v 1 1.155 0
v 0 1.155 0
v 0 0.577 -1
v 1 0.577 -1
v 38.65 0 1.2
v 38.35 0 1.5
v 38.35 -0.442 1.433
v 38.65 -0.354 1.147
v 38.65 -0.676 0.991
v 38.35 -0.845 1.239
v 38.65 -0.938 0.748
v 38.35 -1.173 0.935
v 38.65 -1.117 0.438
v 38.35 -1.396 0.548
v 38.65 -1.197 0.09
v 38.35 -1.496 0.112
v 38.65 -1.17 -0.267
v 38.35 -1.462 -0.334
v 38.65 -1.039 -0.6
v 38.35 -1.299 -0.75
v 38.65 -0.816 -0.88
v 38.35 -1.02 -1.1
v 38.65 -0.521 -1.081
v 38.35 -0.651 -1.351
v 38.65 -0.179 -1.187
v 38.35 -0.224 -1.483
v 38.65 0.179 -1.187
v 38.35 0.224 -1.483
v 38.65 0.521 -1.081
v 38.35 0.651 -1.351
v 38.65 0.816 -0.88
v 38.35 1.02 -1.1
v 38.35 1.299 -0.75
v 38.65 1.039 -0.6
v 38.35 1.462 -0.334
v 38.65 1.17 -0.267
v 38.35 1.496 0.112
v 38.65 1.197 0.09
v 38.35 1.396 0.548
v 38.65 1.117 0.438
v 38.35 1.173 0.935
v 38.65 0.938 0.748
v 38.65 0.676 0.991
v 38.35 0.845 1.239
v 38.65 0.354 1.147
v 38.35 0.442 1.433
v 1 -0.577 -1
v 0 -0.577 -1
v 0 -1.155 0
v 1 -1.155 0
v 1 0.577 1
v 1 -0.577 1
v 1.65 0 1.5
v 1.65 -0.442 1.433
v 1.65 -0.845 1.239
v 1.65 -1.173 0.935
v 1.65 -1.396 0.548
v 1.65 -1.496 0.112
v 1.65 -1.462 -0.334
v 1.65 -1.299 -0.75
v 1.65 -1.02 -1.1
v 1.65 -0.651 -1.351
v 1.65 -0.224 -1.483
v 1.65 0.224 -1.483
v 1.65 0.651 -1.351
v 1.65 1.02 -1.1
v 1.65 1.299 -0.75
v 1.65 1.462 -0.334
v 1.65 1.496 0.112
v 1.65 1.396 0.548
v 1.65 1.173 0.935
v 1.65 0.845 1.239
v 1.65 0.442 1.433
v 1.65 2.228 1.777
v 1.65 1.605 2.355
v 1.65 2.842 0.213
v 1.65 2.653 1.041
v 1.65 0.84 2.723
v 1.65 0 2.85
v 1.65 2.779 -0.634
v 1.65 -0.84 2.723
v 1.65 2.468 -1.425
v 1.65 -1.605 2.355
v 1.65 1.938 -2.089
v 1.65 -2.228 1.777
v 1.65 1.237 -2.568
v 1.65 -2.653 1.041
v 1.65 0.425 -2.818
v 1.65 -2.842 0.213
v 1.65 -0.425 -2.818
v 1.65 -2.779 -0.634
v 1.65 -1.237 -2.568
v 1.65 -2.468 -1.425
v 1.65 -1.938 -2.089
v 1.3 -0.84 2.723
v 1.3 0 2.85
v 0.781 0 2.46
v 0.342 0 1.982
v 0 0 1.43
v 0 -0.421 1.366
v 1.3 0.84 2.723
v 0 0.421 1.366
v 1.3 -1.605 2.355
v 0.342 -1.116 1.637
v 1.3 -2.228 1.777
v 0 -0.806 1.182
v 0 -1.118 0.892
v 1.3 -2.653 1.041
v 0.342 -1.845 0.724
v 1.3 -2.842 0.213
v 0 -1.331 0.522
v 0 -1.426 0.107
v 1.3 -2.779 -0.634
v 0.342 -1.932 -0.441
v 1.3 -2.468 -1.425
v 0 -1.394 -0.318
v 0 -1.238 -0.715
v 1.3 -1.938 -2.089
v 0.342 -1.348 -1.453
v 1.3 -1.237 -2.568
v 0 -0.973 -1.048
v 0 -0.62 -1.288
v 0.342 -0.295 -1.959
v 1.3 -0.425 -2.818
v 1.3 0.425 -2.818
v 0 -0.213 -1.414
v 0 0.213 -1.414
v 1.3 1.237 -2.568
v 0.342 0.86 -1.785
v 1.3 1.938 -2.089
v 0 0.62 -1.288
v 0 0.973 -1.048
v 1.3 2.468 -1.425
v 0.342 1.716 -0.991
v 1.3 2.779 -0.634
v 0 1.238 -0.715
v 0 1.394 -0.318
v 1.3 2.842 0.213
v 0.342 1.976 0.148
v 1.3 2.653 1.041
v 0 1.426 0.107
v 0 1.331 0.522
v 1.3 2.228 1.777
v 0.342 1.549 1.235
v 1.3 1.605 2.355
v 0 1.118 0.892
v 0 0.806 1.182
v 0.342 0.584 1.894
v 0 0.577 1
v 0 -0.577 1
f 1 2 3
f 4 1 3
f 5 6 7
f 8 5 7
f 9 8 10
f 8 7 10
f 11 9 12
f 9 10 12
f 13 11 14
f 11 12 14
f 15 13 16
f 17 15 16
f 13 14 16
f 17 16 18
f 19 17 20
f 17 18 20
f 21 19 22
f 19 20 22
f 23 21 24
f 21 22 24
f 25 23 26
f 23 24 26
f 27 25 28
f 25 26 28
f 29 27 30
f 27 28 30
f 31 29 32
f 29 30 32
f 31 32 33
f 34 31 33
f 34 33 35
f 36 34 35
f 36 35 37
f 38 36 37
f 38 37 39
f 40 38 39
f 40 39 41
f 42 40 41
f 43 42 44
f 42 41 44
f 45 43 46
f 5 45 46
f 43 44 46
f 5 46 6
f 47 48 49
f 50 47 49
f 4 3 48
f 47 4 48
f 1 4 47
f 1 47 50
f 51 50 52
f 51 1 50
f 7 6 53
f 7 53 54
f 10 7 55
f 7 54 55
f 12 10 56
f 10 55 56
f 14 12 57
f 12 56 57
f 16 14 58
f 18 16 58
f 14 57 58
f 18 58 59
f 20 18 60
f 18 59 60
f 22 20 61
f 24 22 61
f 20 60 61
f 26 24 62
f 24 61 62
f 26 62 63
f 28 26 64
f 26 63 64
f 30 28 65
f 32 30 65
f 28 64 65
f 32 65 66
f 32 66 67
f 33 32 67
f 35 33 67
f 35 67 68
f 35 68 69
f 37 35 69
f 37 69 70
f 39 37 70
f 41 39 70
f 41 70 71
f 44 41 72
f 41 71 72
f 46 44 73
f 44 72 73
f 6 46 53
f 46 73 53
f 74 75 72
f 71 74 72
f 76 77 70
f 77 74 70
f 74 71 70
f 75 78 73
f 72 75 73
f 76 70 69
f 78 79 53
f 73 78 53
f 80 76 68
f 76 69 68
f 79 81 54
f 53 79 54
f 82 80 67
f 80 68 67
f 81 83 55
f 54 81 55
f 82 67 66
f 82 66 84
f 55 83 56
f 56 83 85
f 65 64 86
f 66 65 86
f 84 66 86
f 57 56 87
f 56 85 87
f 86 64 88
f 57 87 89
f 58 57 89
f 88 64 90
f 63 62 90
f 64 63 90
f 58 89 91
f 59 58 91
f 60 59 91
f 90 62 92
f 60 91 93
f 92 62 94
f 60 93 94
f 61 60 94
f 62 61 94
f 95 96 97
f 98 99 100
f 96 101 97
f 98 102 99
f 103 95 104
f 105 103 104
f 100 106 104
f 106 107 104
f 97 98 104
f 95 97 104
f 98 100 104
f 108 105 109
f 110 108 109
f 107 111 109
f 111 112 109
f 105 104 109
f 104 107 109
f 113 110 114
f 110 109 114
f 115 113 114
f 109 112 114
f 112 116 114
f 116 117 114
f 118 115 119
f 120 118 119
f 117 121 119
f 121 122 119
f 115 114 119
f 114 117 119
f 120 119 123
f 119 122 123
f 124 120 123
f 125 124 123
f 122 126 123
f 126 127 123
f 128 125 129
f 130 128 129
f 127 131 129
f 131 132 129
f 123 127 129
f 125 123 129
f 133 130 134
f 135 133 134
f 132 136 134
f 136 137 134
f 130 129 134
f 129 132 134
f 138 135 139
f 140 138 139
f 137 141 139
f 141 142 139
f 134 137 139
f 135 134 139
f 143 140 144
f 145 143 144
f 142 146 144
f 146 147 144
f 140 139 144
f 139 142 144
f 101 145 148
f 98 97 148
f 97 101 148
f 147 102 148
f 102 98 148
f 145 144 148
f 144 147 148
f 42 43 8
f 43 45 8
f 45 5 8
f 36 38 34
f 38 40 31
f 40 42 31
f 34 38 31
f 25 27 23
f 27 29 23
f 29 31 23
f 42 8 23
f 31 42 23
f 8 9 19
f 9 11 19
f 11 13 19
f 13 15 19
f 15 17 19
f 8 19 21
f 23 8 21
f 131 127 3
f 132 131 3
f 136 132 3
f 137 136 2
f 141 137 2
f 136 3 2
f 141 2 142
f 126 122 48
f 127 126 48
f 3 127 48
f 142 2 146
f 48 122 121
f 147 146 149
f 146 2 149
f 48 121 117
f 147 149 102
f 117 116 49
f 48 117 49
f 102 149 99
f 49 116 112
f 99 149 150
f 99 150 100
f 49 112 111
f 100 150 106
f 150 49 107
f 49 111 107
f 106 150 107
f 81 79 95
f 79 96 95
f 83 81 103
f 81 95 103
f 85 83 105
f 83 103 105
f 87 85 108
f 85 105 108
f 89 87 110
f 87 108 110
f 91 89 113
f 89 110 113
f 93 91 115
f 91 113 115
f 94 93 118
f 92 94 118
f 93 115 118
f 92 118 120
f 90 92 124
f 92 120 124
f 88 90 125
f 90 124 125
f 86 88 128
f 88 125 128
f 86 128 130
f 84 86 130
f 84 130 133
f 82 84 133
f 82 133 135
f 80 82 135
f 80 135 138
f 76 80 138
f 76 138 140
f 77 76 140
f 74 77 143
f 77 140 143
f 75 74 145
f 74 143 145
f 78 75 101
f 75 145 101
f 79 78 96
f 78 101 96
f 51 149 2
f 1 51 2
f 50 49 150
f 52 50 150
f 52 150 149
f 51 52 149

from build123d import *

# Parameters (mm, degrees)
CHAMFER1_SIZE      = 0.3
CUT_EXTRUDE1_DEPTH = 1


with BuildPart() as part:
    # Sketch1 → Revolve1 (revolve)
    with BuildSketch(Plane.XY, mode=Mode.PRIVATE) as revolve1_sk:
        with BuildLine():
            Line((0, 1.43), (0, 0))
            Line((0, 0), (38.65, 0))
            Line((38.65, 0), (38.65, 1.5))
            Line((38.65, 1.5), (1.65, 1.5))
            Line((1.65, 1.5), (1.65, 2.85))
            Line((1.65, 2.85), (1.3, 2.85))
            ThreePointArc((1.3, 2.85), (0.550445176, 2.231141741), (0, 1.43))
        make_face()
    revolve(revolve1_sk.sketch.rotate(Axis((0, 0, 0), (1, 0, 0)), 90), axis=Axis((0, 0, 0), (1, 0, 0)))

    # Chamfer1
    chamfer1_edges = [part.edges().sort_by_distance(p)[0] for p in [
        (38.65, 0, -1.5),
    ]]
    chamfer(chamfer1_edges, length=CHAMFER1_SIZE)

    # Sketch2 → Cut-Extrude1 (cut)
    with BuildSketch(Plane.ZY):
        Polygon((0, 1.154700538), (-1, 0.577350269), (-1, -0.577350269), (0, -1.154700538), (1, -0.577350269), (1, 0.577350269), align=None)
    extrude(amount=-CUT_EXTRUDE1_DEPTH, mode=Mode.SUBTRACT)


solid = part.part
